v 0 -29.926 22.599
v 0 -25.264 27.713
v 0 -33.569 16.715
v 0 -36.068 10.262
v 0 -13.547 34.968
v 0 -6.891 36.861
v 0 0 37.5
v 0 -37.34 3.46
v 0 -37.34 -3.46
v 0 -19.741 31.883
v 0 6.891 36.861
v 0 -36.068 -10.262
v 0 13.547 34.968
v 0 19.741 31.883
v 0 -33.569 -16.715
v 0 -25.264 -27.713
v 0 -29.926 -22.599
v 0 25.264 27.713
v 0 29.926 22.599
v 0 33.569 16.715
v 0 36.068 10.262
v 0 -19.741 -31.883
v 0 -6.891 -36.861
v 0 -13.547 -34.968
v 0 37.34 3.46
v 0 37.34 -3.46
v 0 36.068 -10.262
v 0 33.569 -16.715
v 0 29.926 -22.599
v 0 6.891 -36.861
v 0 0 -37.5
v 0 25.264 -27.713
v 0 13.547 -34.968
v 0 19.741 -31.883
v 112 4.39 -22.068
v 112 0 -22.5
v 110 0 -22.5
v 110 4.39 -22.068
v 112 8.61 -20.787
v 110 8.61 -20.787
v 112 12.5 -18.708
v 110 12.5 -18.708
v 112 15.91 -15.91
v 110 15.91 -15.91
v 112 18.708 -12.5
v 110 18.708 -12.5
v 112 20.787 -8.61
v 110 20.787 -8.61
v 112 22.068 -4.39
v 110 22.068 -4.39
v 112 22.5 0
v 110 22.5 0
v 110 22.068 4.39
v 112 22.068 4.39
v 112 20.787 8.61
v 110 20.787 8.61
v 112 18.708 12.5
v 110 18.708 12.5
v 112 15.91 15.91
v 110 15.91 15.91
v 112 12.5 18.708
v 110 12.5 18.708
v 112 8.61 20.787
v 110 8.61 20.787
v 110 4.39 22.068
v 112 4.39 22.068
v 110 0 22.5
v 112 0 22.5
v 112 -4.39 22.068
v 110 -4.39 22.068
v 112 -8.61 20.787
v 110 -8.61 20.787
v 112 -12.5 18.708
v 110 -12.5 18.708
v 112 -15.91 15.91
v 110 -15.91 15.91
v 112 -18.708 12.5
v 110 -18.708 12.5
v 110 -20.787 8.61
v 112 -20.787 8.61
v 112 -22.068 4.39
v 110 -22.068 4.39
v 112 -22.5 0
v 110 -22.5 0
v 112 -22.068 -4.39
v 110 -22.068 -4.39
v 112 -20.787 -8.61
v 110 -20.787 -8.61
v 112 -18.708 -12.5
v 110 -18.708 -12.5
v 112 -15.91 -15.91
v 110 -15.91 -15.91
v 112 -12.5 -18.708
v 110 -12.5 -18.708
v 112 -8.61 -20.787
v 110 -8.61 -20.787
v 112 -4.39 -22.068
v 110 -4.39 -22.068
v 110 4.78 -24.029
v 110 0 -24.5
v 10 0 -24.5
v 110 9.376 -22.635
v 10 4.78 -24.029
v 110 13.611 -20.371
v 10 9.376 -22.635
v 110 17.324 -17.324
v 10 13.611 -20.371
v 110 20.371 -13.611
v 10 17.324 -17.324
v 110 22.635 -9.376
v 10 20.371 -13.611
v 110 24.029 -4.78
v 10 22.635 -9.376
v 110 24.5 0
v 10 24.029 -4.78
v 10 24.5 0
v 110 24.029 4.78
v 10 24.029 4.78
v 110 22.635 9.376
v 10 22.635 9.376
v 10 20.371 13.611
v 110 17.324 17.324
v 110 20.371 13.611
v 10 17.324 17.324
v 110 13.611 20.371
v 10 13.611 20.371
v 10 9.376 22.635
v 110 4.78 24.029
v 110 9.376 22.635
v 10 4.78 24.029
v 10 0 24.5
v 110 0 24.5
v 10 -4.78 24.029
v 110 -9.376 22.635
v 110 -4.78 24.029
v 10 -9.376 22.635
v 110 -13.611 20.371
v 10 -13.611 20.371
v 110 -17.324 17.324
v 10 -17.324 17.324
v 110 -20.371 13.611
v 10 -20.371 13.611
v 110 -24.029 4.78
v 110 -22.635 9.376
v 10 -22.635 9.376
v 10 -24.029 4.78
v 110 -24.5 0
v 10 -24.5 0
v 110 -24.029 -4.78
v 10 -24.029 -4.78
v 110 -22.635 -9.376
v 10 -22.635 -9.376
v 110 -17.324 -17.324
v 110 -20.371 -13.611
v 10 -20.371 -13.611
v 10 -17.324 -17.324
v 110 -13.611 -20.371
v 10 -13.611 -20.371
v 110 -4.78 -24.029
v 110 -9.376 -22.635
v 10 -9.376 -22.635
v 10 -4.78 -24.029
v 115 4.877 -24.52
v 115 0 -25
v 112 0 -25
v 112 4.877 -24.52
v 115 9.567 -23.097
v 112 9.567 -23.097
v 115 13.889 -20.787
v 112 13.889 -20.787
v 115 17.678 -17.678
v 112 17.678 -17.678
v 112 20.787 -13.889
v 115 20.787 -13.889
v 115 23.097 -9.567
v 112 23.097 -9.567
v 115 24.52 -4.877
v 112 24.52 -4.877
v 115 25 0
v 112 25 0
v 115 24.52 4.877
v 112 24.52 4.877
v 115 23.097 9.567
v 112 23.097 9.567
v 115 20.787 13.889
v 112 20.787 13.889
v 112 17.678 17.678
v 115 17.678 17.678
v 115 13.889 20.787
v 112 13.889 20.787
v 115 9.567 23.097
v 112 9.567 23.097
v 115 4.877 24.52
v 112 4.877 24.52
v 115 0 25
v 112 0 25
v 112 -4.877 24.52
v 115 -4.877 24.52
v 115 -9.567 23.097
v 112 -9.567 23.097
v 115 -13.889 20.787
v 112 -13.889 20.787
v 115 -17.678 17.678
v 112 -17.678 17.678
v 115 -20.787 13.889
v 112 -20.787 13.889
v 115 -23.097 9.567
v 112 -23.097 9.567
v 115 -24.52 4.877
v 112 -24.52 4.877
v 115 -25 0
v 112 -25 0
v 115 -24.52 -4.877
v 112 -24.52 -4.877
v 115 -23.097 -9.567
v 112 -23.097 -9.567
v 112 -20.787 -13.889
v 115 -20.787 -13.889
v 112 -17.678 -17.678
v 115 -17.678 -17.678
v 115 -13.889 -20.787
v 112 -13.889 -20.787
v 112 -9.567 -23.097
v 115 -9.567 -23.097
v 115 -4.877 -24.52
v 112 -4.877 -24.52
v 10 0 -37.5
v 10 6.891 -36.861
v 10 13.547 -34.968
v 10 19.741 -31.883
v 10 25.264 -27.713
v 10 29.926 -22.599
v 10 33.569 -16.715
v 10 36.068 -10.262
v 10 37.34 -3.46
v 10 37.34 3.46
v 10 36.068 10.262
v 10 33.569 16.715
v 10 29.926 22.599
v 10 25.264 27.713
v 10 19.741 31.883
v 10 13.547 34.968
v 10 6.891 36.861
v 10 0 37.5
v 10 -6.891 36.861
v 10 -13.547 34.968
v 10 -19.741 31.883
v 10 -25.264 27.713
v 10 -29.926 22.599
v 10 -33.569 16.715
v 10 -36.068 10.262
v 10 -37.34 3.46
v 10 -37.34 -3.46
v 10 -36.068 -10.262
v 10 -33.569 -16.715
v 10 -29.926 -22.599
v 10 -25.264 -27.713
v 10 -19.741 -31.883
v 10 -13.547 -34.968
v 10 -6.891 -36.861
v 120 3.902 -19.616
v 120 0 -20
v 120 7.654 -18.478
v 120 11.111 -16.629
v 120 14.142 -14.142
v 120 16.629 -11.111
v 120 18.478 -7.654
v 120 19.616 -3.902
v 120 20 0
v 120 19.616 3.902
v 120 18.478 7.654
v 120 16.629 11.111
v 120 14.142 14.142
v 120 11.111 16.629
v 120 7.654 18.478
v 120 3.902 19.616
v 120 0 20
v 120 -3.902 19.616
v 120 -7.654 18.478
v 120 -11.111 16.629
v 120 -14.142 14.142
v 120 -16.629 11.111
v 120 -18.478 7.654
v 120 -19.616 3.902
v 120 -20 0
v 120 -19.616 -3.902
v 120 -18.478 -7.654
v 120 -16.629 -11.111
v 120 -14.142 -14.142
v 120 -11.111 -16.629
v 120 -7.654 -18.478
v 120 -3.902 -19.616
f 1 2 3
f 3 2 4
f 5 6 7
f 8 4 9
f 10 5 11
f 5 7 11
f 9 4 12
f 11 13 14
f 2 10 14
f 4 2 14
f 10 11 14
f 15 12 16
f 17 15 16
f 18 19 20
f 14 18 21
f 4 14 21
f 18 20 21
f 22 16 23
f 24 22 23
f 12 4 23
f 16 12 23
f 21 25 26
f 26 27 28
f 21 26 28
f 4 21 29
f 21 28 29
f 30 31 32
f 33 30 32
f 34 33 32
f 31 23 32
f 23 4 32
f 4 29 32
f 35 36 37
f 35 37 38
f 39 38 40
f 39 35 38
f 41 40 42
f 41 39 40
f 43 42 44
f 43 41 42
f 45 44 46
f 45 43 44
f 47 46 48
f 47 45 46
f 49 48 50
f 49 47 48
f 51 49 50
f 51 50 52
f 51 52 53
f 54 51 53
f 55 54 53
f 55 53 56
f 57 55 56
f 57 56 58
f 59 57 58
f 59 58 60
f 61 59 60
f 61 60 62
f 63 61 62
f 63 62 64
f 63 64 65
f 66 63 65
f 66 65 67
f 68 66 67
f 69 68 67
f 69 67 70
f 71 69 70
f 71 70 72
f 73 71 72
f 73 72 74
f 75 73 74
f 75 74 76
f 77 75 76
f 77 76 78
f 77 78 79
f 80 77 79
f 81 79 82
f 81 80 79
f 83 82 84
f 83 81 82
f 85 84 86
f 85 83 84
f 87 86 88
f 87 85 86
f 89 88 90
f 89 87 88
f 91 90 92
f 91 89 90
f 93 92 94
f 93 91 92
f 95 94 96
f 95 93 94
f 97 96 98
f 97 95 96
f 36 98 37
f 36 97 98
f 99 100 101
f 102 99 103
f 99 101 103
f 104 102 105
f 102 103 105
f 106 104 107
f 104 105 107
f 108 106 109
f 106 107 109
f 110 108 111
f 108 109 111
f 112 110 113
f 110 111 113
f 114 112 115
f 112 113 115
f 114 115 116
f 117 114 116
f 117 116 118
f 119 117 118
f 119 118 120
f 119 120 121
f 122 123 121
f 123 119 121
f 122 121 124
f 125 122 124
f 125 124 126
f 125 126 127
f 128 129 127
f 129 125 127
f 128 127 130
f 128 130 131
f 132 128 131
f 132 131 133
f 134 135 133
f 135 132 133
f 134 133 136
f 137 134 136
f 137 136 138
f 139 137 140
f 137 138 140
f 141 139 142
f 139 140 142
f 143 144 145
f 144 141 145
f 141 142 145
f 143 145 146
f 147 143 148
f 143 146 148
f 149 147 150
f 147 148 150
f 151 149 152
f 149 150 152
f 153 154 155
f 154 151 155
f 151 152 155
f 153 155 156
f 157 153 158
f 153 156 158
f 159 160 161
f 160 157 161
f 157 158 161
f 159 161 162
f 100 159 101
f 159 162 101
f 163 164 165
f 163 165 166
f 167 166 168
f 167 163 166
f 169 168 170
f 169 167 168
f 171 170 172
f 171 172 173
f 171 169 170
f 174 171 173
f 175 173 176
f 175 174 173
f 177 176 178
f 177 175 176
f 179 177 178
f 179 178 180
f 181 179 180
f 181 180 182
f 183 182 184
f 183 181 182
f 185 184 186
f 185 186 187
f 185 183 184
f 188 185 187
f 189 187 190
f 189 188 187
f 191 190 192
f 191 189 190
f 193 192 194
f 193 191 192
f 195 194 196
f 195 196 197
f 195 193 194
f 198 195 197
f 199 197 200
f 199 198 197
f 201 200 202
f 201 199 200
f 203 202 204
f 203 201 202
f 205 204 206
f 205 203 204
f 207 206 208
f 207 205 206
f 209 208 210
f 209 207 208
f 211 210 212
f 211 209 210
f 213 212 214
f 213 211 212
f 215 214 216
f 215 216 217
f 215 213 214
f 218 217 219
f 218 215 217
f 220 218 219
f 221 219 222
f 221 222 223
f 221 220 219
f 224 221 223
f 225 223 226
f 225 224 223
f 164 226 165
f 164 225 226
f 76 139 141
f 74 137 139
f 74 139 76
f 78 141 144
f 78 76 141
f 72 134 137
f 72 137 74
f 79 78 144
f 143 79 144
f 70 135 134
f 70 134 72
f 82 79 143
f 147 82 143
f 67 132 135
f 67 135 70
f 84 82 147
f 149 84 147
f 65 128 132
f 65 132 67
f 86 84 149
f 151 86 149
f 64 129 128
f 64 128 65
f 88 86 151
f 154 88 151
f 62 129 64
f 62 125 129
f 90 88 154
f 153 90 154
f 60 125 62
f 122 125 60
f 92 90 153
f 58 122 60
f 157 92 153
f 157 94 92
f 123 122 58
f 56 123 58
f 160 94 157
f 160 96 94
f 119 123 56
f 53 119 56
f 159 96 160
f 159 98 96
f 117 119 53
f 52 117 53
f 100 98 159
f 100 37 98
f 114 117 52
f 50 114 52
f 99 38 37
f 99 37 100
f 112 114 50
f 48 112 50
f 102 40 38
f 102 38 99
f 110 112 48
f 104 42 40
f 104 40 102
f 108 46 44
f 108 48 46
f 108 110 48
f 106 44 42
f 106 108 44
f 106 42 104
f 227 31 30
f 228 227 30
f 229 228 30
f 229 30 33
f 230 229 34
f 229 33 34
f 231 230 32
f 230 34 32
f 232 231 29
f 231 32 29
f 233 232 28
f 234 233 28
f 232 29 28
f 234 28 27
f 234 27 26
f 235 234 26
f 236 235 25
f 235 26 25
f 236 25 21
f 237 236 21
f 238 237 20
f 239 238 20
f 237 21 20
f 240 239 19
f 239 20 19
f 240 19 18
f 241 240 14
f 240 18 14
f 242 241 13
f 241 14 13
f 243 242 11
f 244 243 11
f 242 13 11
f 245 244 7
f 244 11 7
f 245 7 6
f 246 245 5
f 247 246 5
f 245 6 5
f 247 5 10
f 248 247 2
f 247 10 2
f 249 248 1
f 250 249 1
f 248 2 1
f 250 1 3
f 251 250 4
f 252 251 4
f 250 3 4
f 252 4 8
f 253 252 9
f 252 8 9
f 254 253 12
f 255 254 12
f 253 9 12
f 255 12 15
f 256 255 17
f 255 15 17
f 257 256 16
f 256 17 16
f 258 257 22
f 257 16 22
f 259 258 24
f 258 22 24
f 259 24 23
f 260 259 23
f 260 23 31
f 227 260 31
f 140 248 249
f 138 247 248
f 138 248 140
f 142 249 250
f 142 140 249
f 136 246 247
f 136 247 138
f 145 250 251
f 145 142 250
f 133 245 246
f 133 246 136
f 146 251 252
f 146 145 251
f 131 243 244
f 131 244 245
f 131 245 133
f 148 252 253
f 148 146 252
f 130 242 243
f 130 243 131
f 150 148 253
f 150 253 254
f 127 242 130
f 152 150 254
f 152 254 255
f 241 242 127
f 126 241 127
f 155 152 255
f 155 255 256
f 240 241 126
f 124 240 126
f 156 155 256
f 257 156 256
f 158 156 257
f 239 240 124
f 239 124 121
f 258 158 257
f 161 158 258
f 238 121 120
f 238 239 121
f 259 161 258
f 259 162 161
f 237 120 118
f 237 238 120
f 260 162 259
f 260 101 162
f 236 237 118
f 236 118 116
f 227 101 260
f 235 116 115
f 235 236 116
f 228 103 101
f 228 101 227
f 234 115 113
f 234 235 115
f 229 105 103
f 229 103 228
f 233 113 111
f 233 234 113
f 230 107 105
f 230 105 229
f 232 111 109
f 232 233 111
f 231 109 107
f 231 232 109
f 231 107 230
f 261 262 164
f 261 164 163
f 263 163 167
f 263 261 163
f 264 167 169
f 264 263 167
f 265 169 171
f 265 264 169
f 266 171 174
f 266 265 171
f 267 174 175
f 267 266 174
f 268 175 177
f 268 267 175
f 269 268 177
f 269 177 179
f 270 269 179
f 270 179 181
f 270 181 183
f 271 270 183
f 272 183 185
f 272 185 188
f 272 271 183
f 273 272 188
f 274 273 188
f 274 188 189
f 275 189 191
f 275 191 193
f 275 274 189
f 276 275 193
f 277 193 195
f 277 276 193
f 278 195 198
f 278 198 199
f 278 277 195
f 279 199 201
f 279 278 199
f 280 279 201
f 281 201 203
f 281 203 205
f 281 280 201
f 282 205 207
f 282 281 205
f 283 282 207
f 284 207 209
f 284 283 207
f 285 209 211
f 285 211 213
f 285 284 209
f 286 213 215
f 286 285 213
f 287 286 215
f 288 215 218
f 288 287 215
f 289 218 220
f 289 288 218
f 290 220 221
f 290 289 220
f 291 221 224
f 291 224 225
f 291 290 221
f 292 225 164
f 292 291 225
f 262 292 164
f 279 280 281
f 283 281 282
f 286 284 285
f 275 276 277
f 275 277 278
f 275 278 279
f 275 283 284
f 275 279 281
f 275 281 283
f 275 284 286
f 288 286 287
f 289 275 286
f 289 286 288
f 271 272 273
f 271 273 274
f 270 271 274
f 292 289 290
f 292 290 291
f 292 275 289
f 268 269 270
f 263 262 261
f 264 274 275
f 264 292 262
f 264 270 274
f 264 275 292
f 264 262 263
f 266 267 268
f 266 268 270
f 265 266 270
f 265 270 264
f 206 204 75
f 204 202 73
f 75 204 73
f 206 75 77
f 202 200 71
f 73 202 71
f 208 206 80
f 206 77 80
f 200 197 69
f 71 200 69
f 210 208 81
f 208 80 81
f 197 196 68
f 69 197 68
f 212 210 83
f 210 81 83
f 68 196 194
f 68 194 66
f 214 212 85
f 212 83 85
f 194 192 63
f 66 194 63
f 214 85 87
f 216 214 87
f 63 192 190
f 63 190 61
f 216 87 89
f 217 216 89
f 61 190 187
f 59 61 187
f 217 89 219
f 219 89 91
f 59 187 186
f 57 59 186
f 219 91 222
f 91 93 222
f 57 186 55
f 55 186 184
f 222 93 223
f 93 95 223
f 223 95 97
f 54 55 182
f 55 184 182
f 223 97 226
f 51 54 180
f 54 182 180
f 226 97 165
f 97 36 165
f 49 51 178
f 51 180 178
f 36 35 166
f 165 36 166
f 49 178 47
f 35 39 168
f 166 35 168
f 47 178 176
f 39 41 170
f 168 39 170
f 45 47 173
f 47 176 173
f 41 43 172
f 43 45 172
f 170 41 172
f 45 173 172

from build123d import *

# Parameters (mm, degrees)
SKETCH1_R          = 37.5
EXTRUDE1_DEPTH     = 10
SKETCH2_R          = 24.5
EXTRUDE2_DEPTH     = 110
SKETCH3_OUTSIDE_W  = 109.032
SKETCH3_OUTSIDE_H  = 109.032
SKETCH3_OUTSIDE_R  = 22.5
CUT_EXTRUDE1_DEPTH = 10
SKETCH4_R          = 25
EXTRUDE3_DEPTH     = 8
CHAMFER1_SIZE      = 5


with BuildPart() as part:
    # Sketch1 → Extrude1 (new body)
    with BuildSketch(Plane(origin=(0, 0, 0), x_dir=(0, 0, -1), z_dir=(1, 0, 0))):
        Circle(SKETCH1_R)
    extrude(amount=EXTRUDE1_DEPTH)

    # Sketch2 → Extrude2 (add)
    with BuildSketch(Plane(origin=(10, 0, 0), x_dir=(0, 0, -1), z_dir=(1, 0, 0))):
        Circle(SKETCH2_R)
    extrude(amount=EXTRUDE2_DEPTH)

    # Sketch3 outside → Cut-Extrude1 (cut)
    with BuildSketch(Plane(origin=(120, 0, 0), x_dir=(0, 0, -1), z_dir=(1, 0, 0))):
        Rectangle(SKETCH3_OUTSIDE_W, SKETCH3_OUTSIDE_H)
        Circle(SKETCH3_OUTSIDE_R, mode=Mode.SUBTRACT)
    extrude(amount=-CUT_EXTRUDE1_DEPTH, mode=Mode.SUBTRACT)

    # Sketch4 → Extrude3 (add)
    with BuildSketch(Plane(origin=(120, 0, 0), x_dir=(0, 0, -1), z_dir=(1, 0, 0))):
        Circle(SKETCH4_R)
    extrude(amount=-EXTRUDE3_DEPTH)

    # Chamfer1
    chamfer1_edges = [part.edges().sort_by_distance(p)[0] for p in [
        (120, 0, 25),
    ]]
    chamfer(chamfer1_edges, length=CHAMFER1_SIZE)


solid = part.part
